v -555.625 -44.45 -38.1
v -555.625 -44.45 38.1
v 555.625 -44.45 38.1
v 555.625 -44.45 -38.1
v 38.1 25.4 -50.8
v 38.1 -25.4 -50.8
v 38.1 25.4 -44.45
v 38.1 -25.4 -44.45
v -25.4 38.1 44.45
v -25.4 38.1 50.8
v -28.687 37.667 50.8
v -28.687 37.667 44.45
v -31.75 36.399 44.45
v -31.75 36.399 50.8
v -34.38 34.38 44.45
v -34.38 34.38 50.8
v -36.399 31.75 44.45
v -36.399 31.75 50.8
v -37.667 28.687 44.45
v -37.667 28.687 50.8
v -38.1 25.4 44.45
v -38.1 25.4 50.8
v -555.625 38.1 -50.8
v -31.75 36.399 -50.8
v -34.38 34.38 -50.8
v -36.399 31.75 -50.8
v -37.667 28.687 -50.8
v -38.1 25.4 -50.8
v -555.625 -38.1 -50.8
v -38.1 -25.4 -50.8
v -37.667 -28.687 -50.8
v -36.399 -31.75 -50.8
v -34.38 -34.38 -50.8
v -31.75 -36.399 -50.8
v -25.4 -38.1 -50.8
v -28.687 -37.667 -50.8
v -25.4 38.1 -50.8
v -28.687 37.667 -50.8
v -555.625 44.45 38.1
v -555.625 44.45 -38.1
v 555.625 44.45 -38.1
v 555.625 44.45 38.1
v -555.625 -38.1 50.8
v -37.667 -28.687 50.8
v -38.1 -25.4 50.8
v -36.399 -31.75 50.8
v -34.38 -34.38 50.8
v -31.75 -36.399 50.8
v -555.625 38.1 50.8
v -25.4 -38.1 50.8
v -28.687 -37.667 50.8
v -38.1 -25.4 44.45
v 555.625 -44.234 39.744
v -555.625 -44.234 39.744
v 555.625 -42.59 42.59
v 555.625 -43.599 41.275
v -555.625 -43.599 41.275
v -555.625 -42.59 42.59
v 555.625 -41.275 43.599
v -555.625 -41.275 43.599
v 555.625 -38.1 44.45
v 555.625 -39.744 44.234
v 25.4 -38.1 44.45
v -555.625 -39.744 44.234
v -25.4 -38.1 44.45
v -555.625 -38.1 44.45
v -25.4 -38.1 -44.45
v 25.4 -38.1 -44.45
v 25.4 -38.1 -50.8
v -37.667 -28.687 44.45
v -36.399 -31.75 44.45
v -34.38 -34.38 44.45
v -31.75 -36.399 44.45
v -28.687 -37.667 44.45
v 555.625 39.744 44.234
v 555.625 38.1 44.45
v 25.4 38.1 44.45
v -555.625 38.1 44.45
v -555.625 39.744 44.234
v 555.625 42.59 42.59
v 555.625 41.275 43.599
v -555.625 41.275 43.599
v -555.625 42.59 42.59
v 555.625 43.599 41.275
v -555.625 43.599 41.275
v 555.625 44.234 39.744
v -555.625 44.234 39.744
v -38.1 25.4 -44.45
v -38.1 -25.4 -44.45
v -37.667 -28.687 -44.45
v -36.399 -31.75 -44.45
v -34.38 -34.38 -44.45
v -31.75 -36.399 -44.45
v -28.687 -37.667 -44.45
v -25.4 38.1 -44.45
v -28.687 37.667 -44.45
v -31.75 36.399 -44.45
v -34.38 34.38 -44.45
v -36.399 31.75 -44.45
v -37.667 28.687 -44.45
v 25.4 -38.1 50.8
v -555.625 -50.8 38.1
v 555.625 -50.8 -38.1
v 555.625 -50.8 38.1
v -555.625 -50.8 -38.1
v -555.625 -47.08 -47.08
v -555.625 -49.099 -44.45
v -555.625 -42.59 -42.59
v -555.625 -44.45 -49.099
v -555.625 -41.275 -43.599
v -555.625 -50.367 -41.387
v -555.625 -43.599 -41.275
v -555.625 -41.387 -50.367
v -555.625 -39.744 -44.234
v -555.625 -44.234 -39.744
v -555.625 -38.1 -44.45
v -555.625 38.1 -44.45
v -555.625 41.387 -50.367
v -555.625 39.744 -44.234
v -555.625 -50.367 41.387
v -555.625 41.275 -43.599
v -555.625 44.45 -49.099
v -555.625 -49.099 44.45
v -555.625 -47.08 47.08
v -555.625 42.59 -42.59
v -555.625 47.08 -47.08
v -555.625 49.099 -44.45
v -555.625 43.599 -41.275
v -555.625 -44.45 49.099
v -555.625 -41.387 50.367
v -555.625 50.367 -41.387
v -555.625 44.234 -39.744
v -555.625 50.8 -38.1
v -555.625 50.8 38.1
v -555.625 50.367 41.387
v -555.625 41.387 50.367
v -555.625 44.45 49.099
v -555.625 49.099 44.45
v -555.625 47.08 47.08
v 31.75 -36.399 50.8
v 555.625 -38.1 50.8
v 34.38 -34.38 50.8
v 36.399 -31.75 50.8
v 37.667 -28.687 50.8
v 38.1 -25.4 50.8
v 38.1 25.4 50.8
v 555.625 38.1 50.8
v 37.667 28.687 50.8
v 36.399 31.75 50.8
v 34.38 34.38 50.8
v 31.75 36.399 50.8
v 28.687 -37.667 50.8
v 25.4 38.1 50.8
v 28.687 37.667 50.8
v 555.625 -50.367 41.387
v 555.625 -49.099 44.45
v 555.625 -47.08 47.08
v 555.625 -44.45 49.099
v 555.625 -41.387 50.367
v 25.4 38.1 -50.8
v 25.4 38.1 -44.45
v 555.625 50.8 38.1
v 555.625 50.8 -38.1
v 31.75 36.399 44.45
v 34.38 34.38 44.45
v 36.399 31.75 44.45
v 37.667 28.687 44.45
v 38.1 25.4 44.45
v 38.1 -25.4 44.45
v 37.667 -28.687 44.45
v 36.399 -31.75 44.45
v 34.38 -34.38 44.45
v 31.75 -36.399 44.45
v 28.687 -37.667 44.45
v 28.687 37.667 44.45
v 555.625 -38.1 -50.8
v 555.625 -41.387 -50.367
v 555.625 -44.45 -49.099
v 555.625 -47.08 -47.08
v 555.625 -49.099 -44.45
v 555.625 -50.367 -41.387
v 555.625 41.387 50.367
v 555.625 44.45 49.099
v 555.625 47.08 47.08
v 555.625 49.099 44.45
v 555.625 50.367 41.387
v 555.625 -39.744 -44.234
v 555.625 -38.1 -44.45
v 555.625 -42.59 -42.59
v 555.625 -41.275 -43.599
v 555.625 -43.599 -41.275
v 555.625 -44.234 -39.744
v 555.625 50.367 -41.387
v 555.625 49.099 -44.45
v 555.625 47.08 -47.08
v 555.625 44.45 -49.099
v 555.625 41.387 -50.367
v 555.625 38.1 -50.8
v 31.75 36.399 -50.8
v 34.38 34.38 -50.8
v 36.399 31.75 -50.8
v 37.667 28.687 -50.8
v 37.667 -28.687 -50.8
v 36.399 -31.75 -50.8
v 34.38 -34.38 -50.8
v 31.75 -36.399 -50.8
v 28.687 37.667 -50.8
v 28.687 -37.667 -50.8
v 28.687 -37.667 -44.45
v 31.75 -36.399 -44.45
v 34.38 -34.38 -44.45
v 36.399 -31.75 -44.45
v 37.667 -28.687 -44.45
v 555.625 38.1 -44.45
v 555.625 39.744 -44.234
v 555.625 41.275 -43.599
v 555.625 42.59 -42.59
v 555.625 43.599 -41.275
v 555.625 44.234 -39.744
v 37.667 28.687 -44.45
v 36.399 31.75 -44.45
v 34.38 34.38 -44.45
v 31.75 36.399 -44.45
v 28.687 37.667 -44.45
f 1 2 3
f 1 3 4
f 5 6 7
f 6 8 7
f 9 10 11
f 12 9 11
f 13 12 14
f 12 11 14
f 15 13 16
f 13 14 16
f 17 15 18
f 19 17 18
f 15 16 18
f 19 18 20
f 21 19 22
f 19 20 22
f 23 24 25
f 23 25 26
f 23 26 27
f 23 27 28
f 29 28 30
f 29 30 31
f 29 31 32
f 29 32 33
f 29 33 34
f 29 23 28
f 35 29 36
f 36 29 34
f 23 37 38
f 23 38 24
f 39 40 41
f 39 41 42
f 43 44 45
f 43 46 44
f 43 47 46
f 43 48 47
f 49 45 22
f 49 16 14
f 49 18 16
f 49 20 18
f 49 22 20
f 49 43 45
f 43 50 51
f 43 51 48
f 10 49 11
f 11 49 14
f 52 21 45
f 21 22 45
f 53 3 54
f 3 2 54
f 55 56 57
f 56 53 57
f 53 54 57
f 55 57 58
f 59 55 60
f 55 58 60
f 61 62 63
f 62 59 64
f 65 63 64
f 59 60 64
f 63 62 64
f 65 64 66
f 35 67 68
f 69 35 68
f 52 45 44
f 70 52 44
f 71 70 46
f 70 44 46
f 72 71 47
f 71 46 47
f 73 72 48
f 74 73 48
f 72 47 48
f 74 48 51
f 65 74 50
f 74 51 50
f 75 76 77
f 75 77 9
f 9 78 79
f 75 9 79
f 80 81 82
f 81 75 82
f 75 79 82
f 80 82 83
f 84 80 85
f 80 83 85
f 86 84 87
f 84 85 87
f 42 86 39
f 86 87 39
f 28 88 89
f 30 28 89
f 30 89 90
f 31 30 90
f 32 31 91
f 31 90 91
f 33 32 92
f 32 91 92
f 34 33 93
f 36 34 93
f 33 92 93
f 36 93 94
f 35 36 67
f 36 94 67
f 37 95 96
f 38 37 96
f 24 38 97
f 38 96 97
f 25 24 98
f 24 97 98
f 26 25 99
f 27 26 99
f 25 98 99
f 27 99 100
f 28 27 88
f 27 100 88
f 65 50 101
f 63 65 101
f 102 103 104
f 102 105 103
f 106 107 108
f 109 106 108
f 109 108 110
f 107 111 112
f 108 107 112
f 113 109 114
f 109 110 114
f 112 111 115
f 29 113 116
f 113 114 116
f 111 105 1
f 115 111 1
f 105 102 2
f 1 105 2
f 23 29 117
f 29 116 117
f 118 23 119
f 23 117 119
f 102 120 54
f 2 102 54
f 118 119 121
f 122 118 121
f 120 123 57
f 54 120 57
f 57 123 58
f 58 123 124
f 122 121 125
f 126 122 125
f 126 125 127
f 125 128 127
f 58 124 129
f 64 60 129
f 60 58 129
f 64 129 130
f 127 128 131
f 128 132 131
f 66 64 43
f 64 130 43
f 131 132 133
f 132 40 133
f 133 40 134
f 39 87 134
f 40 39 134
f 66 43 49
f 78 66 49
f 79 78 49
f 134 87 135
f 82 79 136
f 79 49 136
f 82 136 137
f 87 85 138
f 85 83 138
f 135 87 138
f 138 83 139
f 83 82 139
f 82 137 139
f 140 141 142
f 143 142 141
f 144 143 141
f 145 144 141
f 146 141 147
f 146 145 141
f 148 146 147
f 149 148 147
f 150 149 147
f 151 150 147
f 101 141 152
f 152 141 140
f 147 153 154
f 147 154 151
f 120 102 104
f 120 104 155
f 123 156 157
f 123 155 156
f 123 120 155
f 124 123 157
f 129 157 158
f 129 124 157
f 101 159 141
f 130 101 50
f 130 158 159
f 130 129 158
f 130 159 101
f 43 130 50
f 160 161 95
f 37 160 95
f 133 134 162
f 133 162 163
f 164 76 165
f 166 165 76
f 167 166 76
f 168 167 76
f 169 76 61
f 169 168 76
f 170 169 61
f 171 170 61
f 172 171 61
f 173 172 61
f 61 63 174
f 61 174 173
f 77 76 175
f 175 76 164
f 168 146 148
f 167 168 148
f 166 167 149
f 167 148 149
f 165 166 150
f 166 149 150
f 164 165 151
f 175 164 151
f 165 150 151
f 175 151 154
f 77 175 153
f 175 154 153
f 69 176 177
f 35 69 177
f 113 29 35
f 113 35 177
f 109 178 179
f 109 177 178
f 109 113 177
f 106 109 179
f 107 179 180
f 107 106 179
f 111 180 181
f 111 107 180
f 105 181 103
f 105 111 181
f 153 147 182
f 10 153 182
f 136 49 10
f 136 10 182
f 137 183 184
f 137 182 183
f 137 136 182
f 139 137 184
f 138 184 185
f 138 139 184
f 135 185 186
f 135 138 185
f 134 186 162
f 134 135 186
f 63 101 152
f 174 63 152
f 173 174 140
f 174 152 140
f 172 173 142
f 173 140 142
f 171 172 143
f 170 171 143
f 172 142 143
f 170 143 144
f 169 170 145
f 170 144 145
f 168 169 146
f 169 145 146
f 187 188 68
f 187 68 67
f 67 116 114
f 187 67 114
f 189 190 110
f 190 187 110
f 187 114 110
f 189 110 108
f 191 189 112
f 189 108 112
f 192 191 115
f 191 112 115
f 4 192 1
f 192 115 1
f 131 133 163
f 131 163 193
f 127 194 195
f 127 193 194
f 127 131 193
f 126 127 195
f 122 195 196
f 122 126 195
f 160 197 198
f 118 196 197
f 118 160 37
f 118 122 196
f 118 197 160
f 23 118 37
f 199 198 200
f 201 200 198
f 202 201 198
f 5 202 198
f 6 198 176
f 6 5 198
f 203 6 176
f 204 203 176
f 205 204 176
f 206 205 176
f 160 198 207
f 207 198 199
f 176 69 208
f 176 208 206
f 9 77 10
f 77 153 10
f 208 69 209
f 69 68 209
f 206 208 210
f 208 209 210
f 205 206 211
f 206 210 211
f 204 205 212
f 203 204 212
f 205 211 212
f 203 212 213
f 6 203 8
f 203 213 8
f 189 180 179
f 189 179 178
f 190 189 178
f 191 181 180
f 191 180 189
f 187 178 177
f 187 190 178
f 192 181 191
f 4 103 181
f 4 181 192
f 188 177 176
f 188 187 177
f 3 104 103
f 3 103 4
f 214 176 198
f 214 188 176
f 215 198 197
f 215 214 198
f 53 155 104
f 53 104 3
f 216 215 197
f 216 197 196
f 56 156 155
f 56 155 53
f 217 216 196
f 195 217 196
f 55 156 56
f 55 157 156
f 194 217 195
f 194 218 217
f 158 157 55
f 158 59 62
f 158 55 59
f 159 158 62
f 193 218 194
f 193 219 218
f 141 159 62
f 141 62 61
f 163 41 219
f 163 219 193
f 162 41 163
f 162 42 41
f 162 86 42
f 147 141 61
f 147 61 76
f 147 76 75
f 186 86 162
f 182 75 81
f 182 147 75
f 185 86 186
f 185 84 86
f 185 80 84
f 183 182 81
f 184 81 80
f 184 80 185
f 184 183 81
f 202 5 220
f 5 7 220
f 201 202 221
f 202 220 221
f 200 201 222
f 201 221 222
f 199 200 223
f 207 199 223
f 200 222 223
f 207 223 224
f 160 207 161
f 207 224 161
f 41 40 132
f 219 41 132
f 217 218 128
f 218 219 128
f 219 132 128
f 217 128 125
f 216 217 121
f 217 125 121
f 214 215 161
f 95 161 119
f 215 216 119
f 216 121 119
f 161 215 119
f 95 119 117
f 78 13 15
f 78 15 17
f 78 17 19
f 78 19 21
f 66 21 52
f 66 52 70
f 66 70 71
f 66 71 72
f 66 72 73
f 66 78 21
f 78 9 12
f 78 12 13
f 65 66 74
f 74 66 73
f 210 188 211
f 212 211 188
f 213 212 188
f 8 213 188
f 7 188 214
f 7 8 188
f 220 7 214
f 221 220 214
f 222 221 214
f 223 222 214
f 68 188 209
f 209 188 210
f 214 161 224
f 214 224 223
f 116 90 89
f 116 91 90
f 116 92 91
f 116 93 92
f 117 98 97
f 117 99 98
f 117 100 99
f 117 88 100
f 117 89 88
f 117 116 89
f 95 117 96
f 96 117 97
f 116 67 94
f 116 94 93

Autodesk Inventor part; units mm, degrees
ref_plane "YZ Plane" through (0, 0, 0) normal (1, 0, 0) x (0, 1, 0)
ref_plane "XZ Plane" through (0, 0, 0) normal (0, 1, 0) x (-1, 0, 0)
ref_plane "XY Plane" through (0, 0, 0) normal (0, 0, 1) x (1, 0, 0)
sketch "Sketch5" plane through (0, 0, 0) normal (1, 0, 0) x (0, 1, 0)
  line L0 (-38.1, 50.8) -> (38.1, 50.8)
  line L1 (50.8, 38.1) -> (50.8, -38.1)
  line L2 (38.1, -50.8) -> (-38.1, -50.8)
  line L3 (-50.8, -38.1) -> (-50.8, 38.1)
  line L4 (-50.8, 50.8) -> (50.8, -50.8) construction
  line L5 (50.8, 50.8) -> (-50.8, -50.8) construction
  arc A0 (50.8, 38.1) -> (38.1, 50.8) centre (38.1, 38.1) ccw
  arc A1 (38.1, -50.8) -> (50.8, -38.1) centre (38.1, -38.1) ccw
  arc A2 (-50.8, -38.1) -> (-38.1, -50.8) centre (-38.1, -38.1) ccw
  arc A3 (-38.1, 50.8) -> (-50.8, 38.1) centre (-38.1, 38.1) ccw
  line L6 (44.45, -38.1) -> (44.45, 38.1)
  arc A4 (44.45, 38.1) -> (38.1, 44.45) centre (38.1, 38.1) ccw
  line L7 (38.1, 44.45) -> (-38.1, 44.45)
  arc A5 (-38.1, 44.45) -> (-44.45, 38.1) centre (-38.1, 38.1) ccw
  line L8 (-44.45, 38.1) -> (-44.45, -38.1)
  arc A6 (-44.45, -38.1) -> (-38.1, -44.45) centre (-38.1, -38.1) ccw
  line L9 (-38.1, -44.45) -> (38.1, -44.45)
  arc A7 (38.1, -44.45) -> (44.45, -38.1) centre (38.1, -38.1) ccw
  point P0 (0, 0)
  dimension "d6" = 101.6
  dimension "d7" = 101.6
  dimension "d8" = 12.7
  dimension "d9" = 6.35
extrude "Extrusion4" add sketch "Sketch5" along normal mid plane 1111.25
sketch "Sketch6" plane through (-555.625, -38.1, 50.8) normal (0, 0, 1) x (1, 0, 0)
  line L0 (530.225, 0) -> (581.025, 0)
  line L1 (593.725, 12.7) -> (593.725, 63.5)
  line L2 (581.025, 76.2) -> (530.225, 76.2)
  line L3 (517.525, 63.5) -> (517.525, 12.7)
  line L4 (517.525, 0) -> (593.725, 76.2) construction
  line L5 (593.725, 0) -> (517.525, 76.2) construction
  arc A0 (530.225, 76.2) -> (517.525, 63.5) centre (530.225, 63.5) ccw
  arc A1 (593.725, 63.5) -> (581.025, 76.2) centre (581.025, 63.5) ccw
  arc A2 (517.525, 12.7) -> (530.225, 0) centre (530.225, 12.7) ccw
  arc A3 (581.025, 0) -> (593.725, 12.7) centre (581.025, 12.7) ccw
  point P0 (555.625, 38.1)
  dimension "d12" = 76.2
  dimension "d13" = 76.2
  dimension "d14" = 12.7
extrude "Extrusion5" cut sketch "Sketch6" against normal blind 177.8
properties part number "Model-2_Base Tube-1" material "SS304"
